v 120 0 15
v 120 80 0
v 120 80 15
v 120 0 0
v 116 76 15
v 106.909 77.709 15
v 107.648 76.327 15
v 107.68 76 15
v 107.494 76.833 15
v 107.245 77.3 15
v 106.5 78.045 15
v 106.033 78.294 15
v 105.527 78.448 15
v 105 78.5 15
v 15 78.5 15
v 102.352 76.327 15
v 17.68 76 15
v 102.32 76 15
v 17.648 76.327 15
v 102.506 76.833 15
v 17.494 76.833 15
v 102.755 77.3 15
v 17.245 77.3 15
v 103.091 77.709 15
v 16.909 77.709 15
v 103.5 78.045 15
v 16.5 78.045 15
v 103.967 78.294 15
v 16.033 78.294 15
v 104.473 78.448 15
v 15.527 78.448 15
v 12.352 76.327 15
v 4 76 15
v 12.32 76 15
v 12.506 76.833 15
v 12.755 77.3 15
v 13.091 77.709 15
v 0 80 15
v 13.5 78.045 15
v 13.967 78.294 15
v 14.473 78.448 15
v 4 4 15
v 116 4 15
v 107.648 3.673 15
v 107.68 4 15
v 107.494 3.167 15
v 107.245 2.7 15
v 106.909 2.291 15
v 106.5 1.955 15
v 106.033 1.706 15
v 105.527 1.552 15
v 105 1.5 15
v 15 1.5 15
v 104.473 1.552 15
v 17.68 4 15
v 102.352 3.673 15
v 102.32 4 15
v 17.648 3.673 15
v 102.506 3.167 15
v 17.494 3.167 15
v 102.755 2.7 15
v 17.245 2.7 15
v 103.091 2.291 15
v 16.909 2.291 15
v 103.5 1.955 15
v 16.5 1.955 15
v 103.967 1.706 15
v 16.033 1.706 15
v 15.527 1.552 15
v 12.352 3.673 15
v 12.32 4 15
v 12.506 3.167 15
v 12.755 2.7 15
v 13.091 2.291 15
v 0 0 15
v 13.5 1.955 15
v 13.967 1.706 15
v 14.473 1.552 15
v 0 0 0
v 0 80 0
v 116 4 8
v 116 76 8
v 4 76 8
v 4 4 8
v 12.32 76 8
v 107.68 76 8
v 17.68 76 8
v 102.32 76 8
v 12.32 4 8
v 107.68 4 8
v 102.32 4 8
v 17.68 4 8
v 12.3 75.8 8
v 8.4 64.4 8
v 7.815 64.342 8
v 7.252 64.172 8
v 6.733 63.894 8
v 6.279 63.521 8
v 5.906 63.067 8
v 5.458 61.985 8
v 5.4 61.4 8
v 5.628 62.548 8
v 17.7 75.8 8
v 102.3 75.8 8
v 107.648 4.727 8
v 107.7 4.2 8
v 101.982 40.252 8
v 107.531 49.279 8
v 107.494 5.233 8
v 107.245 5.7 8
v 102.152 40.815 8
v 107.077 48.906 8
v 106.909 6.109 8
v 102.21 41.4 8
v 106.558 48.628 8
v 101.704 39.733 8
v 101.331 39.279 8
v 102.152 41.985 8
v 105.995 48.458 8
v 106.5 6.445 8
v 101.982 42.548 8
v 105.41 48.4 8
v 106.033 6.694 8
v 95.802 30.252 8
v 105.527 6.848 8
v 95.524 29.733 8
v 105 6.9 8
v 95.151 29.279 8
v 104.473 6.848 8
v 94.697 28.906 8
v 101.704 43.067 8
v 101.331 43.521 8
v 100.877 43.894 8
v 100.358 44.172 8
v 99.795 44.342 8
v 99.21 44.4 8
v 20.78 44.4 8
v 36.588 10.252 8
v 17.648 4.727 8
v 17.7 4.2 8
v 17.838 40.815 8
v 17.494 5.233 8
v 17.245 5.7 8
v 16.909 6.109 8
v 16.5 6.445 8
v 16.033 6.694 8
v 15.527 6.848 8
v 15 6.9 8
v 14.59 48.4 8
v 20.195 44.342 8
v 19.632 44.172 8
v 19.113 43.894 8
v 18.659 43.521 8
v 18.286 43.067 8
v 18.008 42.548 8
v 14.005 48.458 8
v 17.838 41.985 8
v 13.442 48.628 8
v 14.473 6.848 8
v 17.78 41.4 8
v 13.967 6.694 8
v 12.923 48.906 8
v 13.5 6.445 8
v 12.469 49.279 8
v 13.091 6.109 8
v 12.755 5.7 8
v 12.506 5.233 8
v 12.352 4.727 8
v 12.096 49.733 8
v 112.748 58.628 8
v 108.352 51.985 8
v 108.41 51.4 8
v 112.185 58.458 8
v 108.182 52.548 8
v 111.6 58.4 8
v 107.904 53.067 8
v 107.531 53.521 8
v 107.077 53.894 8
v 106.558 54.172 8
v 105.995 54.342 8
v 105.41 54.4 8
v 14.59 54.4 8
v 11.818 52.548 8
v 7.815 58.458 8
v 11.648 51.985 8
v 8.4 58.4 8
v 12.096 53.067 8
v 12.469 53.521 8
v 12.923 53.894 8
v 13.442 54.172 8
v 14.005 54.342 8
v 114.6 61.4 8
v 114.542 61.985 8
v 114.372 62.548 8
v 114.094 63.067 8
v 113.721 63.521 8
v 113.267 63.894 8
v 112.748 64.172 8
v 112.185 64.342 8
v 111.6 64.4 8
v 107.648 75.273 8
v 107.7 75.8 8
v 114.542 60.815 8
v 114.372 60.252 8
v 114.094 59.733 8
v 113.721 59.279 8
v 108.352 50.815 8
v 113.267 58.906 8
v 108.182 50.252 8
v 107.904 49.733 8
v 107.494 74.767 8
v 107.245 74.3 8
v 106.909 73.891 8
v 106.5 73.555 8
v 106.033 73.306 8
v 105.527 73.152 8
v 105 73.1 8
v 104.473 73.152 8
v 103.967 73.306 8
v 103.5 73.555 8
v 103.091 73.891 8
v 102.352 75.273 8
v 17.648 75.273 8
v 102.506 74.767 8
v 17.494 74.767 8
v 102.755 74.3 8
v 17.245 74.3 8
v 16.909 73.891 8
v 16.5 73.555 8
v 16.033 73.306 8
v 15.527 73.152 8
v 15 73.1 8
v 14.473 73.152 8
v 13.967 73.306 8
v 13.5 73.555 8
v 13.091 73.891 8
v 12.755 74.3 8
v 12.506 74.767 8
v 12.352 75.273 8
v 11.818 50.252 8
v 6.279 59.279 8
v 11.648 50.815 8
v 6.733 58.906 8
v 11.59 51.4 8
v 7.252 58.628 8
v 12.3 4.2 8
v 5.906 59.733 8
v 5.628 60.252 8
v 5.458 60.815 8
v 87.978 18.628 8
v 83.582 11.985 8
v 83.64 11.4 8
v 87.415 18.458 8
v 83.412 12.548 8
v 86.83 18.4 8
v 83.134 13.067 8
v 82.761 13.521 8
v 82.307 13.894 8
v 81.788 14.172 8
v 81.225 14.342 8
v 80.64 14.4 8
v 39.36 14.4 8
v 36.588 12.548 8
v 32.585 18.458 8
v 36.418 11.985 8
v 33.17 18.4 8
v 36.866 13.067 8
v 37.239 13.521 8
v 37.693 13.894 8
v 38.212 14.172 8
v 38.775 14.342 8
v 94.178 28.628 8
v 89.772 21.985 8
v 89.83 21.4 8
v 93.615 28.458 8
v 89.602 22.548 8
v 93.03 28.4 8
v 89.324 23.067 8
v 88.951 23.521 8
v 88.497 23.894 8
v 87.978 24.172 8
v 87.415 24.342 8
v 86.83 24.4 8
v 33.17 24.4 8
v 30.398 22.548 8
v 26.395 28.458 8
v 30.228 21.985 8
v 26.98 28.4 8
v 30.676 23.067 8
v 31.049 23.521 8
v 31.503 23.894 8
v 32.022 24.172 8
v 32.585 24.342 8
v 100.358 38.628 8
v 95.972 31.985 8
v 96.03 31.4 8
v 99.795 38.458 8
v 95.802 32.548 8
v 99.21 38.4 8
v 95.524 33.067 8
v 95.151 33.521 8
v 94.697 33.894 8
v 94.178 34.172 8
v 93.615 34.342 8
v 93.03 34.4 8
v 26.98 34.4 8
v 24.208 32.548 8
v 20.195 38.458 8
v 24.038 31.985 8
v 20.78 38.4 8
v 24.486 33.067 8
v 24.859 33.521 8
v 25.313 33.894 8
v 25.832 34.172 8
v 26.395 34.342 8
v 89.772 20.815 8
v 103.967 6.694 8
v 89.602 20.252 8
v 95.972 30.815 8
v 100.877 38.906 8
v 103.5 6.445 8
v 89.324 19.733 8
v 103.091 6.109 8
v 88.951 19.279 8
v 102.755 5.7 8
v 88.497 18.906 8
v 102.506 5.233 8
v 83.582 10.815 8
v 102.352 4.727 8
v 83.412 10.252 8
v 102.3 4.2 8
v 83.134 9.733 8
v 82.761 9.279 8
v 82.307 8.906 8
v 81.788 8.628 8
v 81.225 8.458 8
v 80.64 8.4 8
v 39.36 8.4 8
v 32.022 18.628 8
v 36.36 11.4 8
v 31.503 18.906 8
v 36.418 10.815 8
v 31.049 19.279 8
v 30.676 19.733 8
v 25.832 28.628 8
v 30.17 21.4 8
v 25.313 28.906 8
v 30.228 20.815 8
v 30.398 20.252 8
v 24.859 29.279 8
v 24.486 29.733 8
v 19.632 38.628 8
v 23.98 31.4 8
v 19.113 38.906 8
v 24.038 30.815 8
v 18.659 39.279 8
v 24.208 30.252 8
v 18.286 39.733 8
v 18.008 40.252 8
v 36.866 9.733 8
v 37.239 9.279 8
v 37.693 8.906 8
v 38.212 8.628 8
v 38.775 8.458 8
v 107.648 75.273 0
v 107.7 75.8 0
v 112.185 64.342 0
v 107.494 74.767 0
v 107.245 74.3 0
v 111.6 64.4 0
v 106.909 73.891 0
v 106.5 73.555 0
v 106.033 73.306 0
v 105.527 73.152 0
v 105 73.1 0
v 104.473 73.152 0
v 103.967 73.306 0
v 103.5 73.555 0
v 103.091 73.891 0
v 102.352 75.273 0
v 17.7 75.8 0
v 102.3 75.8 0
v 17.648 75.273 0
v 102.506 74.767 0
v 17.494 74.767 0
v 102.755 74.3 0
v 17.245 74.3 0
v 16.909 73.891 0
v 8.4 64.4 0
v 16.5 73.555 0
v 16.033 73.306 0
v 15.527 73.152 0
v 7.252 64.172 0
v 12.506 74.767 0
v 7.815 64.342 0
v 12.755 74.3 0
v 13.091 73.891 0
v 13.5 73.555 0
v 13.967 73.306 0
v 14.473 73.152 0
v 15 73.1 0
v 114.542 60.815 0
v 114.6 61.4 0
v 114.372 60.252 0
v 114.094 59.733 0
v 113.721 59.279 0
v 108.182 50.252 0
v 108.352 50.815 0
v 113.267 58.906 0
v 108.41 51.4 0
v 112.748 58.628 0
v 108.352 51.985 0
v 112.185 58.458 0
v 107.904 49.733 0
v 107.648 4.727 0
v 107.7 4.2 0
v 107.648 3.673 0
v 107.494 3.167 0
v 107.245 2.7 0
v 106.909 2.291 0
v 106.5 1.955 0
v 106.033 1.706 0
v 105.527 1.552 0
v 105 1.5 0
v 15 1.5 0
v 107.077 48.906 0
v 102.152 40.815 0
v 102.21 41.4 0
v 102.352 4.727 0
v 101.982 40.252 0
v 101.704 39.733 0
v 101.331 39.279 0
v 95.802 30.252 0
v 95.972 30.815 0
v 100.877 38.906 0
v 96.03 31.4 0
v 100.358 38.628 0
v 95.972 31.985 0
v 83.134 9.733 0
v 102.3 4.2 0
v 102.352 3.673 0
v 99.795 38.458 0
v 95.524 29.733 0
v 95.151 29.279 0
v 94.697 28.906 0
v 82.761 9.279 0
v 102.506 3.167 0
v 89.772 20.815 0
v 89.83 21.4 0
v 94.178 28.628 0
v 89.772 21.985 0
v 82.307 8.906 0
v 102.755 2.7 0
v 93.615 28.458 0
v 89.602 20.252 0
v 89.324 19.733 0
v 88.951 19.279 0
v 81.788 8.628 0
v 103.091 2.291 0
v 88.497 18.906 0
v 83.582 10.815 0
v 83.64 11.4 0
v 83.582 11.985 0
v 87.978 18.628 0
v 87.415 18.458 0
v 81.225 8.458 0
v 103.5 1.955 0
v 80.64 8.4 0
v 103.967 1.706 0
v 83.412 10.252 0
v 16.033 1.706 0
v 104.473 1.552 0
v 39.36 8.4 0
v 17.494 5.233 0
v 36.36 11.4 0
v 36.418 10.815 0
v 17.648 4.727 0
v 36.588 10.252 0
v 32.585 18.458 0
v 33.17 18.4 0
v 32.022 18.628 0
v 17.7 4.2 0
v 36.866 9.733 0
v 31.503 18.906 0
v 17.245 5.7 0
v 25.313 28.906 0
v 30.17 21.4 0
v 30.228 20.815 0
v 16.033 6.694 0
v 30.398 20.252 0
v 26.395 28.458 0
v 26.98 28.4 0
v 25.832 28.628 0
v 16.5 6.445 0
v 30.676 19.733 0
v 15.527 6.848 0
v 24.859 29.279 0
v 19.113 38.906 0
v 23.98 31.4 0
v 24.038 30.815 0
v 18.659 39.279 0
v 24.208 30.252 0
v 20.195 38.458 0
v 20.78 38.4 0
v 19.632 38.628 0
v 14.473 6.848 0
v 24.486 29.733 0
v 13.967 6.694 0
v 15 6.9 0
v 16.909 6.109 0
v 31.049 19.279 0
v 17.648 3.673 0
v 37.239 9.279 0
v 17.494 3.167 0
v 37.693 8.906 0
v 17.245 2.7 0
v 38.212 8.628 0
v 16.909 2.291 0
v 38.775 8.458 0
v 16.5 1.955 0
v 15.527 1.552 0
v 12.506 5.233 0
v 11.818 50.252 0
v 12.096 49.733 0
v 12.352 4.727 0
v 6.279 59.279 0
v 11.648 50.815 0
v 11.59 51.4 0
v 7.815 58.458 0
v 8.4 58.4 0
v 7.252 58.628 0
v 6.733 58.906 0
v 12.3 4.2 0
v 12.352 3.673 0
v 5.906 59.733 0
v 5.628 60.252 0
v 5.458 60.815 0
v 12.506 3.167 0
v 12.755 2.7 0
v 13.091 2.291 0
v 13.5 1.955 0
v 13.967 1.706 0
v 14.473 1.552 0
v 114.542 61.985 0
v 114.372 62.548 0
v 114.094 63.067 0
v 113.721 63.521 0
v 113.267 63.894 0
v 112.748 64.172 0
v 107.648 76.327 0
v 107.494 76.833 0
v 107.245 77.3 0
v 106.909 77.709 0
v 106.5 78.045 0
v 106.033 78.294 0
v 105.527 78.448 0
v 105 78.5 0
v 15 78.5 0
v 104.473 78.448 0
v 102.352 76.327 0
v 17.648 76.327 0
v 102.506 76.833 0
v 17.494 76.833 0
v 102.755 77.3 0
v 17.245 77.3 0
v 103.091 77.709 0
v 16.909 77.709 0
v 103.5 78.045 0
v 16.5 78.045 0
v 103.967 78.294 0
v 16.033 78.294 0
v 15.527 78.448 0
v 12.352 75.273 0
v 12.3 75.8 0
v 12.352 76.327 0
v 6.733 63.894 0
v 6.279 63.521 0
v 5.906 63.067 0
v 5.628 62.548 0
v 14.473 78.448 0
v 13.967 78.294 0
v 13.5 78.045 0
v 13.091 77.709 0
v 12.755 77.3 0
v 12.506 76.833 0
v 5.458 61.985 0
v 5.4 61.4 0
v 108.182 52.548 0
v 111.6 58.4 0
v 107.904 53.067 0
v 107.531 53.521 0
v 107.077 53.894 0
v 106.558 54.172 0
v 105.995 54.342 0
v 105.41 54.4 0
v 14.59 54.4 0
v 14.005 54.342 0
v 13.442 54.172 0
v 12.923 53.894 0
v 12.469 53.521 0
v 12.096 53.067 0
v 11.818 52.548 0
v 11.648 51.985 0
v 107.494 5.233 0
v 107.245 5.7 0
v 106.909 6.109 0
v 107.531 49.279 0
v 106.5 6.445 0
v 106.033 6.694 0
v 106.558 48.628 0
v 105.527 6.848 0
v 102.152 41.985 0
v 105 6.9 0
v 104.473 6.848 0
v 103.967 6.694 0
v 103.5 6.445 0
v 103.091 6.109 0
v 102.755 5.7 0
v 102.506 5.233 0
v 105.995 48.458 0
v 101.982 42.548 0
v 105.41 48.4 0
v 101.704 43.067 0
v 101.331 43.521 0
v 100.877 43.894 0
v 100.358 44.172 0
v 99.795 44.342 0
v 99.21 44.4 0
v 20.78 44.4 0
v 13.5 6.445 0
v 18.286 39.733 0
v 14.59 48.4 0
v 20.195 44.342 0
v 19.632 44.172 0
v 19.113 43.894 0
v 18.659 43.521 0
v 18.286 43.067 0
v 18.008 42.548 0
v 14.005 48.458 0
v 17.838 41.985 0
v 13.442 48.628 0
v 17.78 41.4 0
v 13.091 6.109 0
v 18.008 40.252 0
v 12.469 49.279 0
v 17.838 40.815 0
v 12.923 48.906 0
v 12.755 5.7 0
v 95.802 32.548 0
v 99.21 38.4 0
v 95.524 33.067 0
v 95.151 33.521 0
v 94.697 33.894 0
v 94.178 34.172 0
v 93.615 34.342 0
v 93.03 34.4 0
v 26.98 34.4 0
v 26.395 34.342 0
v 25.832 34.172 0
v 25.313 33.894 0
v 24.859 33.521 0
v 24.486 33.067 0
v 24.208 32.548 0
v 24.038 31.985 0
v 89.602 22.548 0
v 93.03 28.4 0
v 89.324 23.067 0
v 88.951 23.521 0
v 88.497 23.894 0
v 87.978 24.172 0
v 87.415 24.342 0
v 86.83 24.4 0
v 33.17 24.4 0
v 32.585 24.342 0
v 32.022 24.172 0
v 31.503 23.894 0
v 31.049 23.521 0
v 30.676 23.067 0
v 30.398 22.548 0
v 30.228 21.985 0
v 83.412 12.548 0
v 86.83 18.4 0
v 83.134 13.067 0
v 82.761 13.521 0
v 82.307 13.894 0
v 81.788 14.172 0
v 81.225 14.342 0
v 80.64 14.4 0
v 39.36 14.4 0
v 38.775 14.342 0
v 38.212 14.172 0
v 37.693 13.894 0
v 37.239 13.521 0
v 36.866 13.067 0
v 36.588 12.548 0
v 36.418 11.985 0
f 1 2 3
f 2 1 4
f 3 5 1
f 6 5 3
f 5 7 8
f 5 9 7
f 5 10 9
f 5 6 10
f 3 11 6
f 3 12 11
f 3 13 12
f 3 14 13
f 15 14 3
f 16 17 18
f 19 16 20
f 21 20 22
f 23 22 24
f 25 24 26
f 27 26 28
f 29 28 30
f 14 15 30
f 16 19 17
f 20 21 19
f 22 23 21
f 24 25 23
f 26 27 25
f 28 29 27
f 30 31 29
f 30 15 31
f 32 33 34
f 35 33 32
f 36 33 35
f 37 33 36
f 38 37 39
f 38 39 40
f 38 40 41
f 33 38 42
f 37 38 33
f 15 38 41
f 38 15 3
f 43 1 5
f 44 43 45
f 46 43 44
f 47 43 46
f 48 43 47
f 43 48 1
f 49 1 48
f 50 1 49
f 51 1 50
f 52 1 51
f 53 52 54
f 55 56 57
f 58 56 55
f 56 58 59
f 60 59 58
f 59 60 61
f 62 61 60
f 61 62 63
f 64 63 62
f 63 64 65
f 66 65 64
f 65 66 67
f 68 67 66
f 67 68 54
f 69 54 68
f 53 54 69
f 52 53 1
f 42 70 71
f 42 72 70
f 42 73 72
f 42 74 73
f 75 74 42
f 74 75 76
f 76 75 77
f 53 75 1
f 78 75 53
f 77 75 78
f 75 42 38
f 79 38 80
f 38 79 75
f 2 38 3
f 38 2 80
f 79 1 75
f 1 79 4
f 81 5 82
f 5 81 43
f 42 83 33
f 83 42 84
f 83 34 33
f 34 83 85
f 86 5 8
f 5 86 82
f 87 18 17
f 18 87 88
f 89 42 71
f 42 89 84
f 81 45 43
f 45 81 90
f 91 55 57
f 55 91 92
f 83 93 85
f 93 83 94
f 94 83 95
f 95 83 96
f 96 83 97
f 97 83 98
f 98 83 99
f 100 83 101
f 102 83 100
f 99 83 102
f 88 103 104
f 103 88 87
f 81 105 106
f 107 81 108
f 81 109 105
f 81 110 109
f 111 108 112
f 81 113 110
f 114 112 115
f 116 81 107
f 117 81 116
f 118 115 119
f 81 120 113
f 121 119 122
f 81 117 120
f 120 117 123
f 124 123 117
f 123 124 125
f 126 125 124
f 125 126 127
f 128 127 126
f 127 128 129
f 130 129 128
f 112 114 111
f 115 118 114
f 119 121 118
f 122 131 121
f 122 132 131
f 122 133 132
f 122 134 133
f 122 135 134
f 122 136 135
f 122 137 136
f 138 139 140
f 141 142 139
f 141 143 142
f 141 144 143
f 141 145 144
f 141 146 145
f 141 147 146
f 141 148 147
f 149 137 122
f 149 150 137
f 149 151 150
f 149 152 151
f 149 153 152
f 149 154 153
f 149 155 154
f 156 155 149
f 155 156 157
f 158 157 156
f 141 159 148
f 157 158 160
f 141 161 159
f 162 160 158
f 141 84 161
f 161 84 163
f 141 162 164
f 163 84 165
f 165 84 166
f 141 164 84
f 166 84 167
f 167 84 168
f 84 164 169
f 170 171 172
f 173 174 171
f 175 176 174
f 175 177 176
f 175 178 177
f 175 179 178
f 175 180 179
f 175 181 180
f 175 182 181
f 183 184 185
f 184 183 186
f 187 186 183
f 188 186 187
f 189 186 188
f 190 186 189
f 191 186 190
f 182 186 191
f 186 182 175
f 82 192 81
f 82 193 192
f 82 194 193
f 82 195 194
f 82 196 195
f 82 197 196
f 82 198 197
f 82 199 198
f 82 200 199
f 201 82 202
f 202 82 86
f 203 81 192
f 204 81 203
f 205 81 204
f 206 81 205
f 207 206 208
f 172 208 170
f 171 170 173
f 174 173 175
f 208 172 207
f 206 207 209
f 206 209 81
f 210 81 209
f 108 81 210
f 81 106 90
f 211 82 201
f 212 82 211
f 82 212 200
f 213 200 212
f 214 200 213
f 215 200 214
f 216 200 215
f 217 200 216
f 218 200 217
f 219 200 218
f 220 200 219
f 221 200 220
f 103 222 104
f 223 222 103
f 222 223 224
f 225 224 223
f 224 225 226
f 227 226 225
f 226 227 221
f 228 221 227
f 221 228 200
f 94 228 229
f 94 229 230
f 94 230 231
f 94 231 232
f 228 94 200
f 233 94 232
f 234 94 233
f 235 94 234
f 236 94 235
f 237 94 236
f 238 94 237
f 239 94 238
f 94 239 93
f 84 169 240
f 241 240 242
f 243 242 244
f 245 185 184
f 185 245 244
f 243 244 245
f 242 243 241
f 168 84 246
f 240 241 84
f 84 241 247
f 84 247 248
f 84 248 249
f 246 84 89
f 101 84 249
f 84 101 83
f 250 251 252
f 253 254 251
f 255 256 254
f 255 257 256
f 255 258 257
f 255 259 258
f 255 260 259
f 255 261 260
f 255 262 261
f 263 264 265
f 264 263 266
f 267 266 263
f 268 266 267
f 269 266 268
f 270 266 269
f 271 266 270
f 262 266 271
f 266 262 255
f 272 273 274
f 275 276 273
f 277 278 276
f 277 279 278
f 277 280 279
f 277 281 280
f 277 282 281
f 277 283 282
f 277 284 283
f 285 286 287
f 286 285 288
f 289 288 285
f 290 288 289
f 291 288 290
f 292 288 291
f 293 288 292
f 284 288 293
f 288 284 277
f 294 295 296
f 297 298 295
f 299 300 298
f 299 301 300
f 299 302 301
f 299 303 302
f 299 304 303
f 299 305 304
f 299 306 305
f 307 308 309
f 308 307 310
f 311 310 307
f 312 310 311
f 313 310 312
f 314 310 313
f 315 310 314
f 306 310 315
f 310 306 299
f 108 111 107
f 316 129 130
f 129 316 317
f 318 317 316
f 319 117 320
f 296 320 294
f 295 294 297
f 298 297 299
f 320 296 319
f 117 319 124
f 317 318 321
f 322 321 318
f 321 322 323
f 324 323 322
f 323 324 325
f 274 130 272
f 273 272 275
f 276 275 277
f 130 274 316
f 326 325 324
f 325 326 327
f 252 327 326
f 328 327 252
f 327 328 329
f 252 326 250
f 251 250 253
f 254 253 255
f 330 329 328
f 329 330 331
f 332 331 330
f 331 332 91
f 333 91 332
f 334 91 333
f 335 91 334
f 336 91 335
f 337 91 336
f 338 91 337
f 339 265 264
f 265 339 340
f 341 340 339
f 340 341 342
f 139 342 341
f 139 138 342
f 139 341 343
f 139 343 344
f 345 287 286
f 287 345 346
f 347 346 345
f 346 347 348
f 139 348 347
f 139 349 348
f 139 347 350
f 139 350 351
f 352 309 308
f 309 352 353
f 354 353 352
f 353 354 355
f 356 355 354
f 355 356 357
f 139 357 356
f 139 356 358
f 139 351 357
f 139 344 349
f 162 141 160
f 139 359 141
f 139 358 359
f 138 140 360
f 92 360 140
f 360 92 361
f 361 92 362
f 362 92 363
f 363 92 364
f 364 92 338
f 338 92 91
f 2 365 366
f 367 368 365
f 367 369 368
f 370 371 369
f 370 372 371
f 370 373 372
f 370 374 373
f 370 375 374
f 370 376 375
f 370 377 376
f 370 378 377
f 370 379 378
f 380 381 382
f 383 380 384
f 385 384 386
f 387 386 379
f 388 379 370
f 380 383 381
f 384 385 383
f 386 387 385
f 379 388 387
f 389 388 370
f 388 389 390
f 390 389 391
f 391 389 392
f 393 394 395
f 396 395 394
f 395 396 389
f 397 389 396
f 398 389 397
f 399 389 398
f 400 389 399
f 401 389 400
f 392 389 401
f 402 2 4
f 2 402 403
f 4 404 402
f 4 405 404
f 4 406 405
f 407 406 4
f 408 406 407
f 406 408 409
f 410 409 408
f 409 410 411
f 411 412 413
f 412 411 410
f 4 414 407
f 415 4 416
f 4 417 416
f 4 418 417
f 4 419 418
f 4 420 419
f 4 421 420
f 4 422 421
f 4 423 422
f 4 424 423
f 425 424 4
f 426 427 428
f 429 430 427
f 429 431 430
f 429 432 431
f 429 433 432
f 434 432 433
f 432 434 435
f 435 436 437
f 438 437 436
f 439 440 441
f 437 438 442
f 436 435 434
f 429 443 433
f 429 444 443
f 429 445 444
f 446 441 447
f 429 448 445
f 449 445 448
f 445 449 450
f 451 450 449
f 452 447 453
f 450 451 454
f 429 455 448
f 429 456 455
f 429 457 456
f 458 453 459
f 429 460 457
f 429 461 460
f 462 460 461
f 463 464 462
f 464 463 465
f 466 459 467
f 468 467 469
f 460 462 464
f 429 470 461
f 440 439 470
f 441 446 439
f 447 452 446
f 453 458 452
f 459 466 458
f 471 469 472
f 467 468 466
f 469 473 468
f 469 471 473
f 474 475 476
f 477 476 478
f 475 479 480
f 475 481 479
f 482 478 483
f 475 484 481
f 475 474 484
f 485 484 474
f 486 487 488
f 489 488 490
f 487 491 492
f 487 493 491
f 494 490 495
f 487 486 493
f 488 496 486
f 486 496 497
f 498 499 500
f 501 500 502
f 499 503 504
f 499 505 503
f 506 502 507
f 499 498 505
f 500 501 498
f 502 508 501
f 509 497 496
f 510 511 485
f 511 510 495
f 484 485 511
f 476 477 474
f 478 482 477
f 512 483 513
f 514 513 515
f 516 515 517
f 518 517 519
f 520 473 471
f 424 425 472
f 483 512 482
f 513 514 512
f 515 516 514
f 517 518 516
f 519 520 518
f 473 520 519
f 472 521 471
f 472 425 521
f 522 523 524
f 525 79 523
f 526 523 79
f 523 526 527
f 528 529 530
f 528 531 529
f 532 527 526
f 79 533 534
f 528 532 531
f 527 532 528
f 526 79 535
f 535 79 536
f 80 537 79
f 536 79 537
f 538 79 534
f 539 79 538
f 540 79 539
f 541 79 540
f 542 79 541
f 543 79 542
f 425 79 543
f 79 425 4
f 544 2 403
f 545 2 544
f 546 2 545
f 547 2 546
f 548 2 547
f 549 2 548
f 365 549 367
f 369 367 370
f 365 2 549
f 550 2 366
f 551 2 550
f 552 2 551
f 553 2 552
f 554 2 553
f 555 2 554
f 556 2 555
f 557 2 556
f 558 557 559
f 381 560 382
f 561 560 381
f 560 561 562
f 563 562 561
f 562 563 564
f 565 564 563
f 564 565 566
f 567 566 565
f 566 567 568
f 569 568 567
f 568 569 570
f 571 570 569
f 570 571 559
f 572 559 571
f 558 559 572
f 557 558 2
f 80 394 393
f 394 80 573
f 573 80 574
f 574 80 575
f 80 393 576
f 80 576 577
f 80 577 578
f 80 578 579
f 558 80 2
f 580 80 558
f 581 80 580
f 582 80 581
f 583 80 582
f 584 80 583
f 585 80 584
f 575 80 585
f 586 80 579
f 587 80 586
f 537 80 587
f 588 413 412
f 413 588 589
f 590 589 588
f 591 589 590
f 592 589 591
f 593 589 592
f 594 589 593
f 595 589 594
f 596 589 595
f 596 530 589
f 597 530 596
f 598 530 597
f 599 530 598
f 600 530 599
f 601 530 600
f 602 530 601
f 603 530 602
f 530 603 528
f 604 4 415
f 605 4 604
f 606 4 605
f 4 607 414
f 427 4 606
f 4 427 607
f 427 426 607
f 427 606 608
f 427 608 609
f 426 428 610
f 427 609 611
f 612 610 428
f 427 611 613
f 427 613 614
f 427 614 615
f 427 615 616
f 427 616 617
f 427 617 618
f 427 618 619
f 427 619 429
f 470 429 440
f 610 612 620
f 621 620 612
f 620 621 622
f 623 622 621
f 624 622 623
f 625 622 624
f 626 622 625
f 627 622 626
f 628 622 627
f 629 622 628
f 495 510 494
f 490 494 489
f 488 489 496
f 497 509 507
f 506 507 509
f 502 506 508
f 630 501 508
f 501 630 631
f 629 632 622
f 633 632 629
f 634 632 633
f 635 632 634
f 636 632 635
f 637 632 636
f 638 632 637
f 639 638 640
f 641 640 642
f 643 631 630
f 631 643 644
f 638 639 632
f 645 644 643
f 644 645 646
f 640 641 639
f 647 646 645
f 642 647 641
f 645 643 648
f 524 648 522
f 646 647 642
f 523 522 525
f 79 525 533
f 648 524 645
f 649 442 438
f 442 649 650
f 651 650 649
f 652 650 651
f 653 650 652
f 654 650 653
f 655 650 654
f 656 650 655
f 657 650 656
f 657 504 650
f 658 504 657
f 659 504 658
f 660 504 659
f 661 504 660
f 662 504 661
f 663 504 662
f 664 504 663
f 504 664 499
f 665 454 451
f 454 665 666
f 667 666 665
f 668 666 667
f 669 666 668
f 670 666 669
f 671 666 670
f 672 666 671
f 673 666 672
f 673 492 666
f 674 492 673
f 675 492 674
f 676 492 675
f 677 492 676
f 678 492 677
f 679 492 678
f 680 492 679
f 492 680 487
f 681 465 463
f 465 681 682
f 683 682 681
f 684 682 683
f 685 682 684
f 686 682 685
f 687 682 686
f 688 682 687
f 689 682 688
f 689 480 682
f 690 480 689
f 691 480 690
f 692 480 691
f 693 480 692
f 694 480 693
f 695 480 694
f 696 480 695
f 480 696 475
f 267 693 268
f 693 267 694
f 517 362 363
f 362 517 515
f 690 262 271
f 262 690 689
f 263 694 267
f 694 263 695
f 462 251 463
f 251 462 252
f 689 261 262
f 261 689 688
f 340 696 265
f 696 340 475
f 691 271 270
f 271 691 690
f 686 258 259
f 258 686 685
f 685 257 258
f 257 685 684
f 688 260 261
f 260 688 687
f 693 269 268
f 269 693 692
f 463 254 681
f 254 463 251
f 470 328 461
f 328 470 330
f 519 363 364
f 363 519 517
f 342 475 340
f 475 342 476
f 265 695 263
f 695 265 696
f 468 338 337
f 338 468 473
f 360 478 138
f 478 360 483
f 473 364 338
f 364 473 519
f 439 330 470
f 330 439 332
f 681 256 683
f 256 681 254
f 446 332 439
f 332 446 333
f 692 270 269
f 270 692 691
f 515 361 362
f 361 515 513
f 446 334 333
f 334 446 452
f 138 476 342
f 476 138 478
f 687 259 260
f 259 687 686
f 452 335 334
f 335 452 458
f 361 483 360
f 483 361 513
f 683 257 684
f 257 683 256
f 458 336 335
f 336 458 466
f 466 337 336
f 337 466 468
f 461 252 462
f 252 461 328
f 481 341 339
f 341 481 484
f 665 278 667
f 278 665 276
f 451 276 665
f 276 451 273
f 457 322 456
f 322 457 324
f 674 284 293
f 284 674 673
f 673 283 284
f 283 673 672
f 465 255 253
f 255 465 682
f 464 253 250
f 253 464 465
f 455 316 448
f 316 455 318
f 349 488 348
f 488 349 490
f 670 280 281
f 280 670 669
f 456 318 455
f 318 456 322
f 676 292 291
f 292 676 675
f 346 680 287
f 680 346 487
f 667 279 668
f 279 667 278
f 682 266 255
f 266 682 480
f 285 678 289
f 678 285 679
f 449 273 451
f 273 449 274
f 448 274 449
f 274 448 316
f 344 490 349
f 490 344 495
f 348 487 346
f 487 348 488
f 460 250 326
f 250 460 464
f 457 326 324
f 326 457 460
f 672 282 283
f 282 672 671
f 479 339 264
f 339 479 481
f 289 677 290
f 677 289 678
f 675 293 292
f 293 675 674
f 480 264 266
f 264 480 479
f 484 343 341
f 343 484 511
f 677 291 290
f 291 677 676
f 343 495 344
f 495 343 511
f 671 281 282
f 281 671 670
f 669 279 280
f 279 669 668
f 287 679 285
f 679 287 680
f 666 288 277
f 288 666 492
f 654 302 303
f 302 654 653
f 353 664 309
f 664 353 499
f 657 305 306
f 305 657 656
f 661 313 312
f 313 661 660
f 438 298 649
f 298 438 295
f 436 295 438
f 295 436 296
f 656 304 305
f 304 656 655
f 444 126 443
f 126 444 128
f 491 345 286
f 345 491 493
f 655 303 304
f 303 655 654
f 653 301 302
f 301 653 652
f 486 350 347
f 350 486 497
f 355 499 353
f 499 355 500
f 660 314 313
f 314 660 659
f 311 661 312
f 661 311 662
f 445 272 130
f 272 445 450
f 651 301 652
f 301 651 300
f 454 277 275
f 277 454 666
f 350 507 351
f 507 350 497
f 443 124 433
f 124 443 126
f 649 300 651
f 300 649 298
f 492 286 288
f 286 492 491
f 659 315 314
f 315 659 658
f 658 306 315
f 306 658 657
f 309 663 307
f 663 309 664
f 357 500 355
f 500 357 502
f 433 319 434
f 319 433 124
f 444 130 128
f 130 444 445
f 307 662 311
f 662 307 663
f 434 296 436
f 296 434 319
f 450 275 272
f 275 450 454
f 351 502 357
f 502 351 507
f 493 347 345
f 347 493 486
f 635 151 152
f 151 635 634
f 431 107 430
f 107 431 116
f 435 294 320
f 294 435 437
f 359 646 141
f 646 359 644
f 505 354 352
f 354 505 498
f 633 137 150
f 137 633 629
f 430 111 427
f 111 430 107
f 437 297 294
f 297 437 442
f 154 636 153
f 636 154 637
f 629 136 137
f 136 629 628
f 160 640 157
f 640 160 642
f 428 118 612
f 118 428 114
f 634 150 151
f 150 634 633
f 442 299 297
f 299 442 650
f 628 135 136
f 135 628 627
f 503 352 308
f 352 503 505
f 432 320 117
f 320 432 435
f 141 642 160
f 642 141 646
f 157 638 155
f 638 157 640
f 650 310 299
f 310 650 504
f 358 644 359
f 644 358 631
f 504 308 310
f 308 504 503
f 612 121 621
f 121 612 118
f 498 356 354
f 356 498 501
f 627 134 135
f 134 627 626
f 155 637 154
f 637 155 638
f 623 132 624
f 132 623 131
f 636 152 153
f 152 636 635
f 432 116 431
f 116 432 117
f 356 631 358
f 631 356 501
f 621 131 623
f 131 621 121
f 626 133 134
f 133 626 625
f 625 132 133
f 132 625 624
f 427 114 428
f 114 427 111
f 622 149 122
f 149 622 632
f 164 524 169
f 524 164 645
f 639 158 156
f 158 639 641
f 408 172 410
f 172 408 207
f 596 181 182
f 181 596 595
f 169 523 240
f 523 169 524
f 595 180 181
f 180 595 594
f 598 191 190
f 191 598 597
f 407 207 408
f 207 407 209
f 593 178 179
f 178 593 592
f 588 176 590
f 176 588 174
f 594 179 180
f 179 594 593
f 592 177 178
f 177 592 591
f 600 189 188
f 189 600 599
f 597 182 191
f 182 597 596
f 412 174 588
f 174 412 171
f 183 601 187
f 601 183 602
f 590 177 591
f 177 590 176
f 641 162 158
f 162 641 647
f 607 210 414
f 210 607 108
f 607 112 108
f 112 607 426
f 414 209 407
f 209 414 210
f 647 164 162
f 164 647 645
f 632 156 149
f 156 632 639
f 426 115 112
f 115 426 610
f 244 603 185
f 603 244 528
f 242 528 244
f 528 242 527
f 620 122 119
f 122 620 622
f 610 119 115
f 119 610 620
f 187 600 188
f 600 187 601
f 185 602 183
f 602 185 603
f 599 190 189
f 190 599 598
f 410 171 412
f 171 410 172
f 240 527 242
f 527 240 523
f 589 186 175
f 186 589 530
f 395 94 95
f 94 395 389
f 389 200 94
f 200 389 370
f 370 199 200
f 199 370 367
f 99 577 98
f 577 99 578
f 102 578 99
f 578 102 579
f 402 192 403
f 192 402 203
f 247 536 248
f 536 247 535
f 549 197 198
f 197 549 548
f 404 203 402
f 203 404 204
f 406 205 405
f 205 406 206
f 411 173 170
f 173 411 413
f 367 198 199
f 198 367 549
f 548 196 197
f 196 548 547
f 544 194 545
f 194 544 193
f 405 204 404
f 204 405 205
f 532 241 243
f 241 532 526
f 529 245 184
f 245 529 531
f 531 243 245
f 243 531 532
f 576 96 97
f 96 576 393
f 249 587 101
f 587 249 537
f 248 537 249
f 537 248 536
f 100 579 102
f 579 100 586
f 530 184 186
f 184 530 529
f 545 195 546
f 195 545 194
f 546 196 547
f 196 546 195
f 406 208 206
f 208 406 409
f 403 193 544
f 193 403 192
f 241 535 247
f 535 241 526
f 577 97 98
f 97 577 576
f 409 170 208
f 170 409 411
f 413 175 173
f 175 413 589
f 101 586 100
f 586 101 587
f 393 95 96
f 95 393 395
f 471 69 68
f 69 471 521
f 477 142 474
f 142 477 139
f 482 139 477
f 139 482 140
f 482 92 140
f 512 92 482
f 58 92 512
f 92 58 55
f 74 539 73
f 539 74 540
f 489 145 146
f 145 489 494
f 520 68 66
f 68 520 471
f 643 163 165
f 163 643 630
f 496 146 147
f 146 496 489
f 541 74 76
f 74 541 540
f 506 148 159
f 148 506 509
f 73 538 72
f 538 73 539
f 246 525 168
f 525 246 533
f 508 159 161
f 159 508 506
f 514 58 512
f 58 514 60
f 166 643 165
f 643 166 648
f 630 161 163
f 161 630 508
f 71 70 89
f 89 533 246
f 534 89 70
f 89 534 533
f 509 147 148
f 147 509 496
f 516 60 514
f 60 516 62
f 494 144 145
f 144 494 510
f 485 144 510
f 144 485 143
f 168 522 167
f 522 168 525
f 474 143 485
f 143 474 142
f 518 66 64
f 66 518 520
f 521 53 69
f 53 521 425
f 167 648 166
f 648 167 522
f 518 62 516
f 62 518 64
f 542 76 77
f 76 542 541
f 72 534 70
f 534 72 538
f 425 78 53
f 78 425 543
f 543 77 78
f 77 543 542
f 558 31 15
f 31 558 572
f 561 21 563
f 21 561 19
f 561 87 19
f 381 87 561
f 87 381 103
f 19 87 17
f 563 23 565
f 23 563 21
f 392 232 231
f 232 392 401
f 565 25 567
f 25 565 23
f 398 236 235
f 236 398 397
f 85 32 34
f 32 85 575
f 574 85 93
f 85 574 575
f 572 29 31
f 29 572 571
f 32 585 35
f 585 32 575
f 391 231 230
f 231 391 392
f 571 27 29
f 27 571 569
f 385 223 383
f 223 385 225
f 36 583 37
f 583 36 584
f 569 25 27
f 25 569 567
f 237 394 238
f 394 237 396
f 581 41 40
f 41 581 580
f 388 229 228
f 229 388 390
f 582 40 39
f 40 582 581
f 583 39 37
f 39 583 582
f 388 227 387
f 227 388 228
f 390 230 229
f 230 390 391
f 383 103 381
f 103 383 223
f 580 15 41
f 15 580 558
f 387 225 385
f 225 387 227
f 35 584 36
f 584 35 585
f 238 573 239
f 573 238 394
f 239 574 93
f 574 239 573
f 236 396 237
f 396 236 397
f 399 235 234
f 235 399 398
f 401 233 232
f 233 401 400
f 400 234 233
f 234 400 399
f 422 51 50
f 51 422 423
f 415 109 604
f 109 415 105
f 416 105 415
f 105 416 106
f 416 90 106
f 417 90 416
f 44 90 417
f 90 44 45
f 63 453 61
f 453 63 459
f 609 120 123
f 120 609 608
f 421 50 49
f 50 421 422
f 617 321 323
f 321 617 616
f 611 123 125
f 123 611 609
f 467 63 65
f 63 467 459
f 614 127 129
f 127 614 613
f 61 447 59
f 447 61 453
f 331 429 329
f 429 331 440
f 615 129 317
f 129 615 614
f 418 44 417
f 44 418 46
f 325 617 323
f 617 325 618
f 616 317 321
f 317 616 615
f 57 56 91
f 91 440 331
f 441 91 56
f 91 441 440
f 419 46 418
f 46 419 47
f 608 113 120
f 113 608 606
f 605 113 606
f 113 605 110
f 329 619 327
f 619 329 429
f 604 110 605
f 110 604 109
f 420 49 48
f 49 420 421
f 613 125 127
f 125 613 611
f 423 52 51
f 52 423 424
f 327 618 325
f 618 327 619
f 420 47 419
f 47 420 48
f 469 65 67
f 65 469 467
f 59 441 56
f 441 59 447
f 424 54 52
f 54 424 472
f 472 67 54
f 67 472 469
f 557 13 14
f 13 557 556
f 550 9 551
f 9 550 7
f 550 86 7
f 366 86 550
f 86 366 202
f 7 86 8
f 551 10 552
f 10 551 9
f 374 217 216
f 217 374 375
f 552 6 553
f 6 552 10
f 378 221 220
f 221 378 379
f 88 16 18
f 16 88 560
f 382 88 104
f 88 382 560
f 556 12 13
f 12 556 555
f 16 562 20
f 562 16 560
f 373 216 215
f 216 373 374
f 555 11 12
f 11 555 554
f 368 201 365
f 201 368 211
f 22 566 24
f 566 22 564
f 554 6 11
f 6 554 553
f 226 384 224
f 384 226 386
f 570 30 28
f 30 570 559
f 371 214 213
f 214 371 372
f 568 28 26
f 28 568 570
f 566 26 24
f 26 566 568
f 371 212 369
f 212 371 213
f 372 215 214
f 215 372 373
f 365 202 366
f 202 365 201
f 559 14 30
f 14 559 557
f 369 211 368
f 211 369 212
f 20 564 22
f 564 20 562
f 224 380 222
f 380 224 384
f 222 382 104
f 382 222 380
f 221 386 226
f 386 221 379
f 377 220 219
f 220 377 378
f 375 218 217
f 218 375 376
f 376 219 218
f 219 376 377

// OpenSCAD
$fn = 32;

// ----------------------------------------------------------------------
// Slotted panel: 120 x 80 mm, 6 рядов of slots
// ----------------------------------------------------------------------

// --- parameters (mm) ---
panel_w = 120;            // panel width
panel_d = 80;             // panel depth
thick = 8;                // panel thickness
slot_w = 6;               // slot width
pitch0 = 10;              // first row pitch
pitch_step = 2.4;         // pitch increase per row
margin = 8.4;             // margin around the slot field
rows = 6;                 // number of slot rows
mount_d = 5.4;            // mounting holes
mount_x = 45;             // mounting hole offset
rim_h = 15;               // rim height
rim_t = 4;                // rim wall thickness

difference() {
  union() {
    cube([panel_w, panel_d, thick]);
    translate([0, 0, thick - 1]) difference() {
      cube([panel_w, panel_d, rim_h - thick + 1]);
      translate([rim_t, rim_t, -2.5]) cube([panel_w - 2 * rim_t, panel_d - 2 * rim_t, rim_h - thick + 6]);
    }
  }
  /* slot rows: stadium shaped cutters, 2.5 mm clear of both faces */
  /* row 0: pitch 10, length 41.28 */
  hull() {
    translate([39.36, 11.4, -2.5]) cylinder(h = thick + 5, d = slot_w);
    translate([80.64, 11.4, -2.5]) cylinder(h = thick + 5, d = slot_w);
  }
  /* row 1: pitch 10, length 53.66 */
  hull() {
    translate([33.17, 21.4, -2.5]) cylinder(h = thick + 5, d = slot_w);
    translate([86.83, 21.4, -2.5]) cylinder(h = thick + 5, d = slot_w);
  }
  /* row 2: pitch 10, length 66.05 */
  hull() {
    translate([26.98, 31.4, -2.5]) cylinder(h = thick + 5, d = slot_w);
    translate([93.03, 31.4, -2.5]) cylinder(h = thick + 5, d = slot_w);
  }
  /* row 3: pitch 10, length 78.43 */
  hull() {
    translate([20.78, 41.4, -2.5]) cylinder(h = thick + 5, d = slot_w);
    translate([99.21, 41.4, -2.5]) cylinder(h = thick + 5, d = slot_w);
  }
  /* row 4: pitch 10, length 90.82 */
  hull() {
    translate([14.59, 51.4, -2.5]) cylinder(h = thick + 5, d = slot_w);
    translate([105.41, 51.4, -2.5]) cylinder(h = thick + 5, d = slot_w);
  }
  /* row 5: pitch 10, length 103.2 */
  hull() {
    translate([8.4, 61.4, -2.5]) cylinder(h = thick + 5, d = slot_w);
    translate([111.6, 61.4, -2.5]) cylinder(h = thick + 5, d = slot_w);
  }
  translate([15, 4.2, -2.5]) cylinder(h = 20, d = mount_d);
  translate([15, 75.8, -2.5]) cylinder(h = 20, d = mount_d);
  translate([105, 4.2, -2.5]) cylinder(h = 20, d = mount_d);
  translate([105, 75.8, -2.5]) cylinder(h = 20, d = mount_d);
}
